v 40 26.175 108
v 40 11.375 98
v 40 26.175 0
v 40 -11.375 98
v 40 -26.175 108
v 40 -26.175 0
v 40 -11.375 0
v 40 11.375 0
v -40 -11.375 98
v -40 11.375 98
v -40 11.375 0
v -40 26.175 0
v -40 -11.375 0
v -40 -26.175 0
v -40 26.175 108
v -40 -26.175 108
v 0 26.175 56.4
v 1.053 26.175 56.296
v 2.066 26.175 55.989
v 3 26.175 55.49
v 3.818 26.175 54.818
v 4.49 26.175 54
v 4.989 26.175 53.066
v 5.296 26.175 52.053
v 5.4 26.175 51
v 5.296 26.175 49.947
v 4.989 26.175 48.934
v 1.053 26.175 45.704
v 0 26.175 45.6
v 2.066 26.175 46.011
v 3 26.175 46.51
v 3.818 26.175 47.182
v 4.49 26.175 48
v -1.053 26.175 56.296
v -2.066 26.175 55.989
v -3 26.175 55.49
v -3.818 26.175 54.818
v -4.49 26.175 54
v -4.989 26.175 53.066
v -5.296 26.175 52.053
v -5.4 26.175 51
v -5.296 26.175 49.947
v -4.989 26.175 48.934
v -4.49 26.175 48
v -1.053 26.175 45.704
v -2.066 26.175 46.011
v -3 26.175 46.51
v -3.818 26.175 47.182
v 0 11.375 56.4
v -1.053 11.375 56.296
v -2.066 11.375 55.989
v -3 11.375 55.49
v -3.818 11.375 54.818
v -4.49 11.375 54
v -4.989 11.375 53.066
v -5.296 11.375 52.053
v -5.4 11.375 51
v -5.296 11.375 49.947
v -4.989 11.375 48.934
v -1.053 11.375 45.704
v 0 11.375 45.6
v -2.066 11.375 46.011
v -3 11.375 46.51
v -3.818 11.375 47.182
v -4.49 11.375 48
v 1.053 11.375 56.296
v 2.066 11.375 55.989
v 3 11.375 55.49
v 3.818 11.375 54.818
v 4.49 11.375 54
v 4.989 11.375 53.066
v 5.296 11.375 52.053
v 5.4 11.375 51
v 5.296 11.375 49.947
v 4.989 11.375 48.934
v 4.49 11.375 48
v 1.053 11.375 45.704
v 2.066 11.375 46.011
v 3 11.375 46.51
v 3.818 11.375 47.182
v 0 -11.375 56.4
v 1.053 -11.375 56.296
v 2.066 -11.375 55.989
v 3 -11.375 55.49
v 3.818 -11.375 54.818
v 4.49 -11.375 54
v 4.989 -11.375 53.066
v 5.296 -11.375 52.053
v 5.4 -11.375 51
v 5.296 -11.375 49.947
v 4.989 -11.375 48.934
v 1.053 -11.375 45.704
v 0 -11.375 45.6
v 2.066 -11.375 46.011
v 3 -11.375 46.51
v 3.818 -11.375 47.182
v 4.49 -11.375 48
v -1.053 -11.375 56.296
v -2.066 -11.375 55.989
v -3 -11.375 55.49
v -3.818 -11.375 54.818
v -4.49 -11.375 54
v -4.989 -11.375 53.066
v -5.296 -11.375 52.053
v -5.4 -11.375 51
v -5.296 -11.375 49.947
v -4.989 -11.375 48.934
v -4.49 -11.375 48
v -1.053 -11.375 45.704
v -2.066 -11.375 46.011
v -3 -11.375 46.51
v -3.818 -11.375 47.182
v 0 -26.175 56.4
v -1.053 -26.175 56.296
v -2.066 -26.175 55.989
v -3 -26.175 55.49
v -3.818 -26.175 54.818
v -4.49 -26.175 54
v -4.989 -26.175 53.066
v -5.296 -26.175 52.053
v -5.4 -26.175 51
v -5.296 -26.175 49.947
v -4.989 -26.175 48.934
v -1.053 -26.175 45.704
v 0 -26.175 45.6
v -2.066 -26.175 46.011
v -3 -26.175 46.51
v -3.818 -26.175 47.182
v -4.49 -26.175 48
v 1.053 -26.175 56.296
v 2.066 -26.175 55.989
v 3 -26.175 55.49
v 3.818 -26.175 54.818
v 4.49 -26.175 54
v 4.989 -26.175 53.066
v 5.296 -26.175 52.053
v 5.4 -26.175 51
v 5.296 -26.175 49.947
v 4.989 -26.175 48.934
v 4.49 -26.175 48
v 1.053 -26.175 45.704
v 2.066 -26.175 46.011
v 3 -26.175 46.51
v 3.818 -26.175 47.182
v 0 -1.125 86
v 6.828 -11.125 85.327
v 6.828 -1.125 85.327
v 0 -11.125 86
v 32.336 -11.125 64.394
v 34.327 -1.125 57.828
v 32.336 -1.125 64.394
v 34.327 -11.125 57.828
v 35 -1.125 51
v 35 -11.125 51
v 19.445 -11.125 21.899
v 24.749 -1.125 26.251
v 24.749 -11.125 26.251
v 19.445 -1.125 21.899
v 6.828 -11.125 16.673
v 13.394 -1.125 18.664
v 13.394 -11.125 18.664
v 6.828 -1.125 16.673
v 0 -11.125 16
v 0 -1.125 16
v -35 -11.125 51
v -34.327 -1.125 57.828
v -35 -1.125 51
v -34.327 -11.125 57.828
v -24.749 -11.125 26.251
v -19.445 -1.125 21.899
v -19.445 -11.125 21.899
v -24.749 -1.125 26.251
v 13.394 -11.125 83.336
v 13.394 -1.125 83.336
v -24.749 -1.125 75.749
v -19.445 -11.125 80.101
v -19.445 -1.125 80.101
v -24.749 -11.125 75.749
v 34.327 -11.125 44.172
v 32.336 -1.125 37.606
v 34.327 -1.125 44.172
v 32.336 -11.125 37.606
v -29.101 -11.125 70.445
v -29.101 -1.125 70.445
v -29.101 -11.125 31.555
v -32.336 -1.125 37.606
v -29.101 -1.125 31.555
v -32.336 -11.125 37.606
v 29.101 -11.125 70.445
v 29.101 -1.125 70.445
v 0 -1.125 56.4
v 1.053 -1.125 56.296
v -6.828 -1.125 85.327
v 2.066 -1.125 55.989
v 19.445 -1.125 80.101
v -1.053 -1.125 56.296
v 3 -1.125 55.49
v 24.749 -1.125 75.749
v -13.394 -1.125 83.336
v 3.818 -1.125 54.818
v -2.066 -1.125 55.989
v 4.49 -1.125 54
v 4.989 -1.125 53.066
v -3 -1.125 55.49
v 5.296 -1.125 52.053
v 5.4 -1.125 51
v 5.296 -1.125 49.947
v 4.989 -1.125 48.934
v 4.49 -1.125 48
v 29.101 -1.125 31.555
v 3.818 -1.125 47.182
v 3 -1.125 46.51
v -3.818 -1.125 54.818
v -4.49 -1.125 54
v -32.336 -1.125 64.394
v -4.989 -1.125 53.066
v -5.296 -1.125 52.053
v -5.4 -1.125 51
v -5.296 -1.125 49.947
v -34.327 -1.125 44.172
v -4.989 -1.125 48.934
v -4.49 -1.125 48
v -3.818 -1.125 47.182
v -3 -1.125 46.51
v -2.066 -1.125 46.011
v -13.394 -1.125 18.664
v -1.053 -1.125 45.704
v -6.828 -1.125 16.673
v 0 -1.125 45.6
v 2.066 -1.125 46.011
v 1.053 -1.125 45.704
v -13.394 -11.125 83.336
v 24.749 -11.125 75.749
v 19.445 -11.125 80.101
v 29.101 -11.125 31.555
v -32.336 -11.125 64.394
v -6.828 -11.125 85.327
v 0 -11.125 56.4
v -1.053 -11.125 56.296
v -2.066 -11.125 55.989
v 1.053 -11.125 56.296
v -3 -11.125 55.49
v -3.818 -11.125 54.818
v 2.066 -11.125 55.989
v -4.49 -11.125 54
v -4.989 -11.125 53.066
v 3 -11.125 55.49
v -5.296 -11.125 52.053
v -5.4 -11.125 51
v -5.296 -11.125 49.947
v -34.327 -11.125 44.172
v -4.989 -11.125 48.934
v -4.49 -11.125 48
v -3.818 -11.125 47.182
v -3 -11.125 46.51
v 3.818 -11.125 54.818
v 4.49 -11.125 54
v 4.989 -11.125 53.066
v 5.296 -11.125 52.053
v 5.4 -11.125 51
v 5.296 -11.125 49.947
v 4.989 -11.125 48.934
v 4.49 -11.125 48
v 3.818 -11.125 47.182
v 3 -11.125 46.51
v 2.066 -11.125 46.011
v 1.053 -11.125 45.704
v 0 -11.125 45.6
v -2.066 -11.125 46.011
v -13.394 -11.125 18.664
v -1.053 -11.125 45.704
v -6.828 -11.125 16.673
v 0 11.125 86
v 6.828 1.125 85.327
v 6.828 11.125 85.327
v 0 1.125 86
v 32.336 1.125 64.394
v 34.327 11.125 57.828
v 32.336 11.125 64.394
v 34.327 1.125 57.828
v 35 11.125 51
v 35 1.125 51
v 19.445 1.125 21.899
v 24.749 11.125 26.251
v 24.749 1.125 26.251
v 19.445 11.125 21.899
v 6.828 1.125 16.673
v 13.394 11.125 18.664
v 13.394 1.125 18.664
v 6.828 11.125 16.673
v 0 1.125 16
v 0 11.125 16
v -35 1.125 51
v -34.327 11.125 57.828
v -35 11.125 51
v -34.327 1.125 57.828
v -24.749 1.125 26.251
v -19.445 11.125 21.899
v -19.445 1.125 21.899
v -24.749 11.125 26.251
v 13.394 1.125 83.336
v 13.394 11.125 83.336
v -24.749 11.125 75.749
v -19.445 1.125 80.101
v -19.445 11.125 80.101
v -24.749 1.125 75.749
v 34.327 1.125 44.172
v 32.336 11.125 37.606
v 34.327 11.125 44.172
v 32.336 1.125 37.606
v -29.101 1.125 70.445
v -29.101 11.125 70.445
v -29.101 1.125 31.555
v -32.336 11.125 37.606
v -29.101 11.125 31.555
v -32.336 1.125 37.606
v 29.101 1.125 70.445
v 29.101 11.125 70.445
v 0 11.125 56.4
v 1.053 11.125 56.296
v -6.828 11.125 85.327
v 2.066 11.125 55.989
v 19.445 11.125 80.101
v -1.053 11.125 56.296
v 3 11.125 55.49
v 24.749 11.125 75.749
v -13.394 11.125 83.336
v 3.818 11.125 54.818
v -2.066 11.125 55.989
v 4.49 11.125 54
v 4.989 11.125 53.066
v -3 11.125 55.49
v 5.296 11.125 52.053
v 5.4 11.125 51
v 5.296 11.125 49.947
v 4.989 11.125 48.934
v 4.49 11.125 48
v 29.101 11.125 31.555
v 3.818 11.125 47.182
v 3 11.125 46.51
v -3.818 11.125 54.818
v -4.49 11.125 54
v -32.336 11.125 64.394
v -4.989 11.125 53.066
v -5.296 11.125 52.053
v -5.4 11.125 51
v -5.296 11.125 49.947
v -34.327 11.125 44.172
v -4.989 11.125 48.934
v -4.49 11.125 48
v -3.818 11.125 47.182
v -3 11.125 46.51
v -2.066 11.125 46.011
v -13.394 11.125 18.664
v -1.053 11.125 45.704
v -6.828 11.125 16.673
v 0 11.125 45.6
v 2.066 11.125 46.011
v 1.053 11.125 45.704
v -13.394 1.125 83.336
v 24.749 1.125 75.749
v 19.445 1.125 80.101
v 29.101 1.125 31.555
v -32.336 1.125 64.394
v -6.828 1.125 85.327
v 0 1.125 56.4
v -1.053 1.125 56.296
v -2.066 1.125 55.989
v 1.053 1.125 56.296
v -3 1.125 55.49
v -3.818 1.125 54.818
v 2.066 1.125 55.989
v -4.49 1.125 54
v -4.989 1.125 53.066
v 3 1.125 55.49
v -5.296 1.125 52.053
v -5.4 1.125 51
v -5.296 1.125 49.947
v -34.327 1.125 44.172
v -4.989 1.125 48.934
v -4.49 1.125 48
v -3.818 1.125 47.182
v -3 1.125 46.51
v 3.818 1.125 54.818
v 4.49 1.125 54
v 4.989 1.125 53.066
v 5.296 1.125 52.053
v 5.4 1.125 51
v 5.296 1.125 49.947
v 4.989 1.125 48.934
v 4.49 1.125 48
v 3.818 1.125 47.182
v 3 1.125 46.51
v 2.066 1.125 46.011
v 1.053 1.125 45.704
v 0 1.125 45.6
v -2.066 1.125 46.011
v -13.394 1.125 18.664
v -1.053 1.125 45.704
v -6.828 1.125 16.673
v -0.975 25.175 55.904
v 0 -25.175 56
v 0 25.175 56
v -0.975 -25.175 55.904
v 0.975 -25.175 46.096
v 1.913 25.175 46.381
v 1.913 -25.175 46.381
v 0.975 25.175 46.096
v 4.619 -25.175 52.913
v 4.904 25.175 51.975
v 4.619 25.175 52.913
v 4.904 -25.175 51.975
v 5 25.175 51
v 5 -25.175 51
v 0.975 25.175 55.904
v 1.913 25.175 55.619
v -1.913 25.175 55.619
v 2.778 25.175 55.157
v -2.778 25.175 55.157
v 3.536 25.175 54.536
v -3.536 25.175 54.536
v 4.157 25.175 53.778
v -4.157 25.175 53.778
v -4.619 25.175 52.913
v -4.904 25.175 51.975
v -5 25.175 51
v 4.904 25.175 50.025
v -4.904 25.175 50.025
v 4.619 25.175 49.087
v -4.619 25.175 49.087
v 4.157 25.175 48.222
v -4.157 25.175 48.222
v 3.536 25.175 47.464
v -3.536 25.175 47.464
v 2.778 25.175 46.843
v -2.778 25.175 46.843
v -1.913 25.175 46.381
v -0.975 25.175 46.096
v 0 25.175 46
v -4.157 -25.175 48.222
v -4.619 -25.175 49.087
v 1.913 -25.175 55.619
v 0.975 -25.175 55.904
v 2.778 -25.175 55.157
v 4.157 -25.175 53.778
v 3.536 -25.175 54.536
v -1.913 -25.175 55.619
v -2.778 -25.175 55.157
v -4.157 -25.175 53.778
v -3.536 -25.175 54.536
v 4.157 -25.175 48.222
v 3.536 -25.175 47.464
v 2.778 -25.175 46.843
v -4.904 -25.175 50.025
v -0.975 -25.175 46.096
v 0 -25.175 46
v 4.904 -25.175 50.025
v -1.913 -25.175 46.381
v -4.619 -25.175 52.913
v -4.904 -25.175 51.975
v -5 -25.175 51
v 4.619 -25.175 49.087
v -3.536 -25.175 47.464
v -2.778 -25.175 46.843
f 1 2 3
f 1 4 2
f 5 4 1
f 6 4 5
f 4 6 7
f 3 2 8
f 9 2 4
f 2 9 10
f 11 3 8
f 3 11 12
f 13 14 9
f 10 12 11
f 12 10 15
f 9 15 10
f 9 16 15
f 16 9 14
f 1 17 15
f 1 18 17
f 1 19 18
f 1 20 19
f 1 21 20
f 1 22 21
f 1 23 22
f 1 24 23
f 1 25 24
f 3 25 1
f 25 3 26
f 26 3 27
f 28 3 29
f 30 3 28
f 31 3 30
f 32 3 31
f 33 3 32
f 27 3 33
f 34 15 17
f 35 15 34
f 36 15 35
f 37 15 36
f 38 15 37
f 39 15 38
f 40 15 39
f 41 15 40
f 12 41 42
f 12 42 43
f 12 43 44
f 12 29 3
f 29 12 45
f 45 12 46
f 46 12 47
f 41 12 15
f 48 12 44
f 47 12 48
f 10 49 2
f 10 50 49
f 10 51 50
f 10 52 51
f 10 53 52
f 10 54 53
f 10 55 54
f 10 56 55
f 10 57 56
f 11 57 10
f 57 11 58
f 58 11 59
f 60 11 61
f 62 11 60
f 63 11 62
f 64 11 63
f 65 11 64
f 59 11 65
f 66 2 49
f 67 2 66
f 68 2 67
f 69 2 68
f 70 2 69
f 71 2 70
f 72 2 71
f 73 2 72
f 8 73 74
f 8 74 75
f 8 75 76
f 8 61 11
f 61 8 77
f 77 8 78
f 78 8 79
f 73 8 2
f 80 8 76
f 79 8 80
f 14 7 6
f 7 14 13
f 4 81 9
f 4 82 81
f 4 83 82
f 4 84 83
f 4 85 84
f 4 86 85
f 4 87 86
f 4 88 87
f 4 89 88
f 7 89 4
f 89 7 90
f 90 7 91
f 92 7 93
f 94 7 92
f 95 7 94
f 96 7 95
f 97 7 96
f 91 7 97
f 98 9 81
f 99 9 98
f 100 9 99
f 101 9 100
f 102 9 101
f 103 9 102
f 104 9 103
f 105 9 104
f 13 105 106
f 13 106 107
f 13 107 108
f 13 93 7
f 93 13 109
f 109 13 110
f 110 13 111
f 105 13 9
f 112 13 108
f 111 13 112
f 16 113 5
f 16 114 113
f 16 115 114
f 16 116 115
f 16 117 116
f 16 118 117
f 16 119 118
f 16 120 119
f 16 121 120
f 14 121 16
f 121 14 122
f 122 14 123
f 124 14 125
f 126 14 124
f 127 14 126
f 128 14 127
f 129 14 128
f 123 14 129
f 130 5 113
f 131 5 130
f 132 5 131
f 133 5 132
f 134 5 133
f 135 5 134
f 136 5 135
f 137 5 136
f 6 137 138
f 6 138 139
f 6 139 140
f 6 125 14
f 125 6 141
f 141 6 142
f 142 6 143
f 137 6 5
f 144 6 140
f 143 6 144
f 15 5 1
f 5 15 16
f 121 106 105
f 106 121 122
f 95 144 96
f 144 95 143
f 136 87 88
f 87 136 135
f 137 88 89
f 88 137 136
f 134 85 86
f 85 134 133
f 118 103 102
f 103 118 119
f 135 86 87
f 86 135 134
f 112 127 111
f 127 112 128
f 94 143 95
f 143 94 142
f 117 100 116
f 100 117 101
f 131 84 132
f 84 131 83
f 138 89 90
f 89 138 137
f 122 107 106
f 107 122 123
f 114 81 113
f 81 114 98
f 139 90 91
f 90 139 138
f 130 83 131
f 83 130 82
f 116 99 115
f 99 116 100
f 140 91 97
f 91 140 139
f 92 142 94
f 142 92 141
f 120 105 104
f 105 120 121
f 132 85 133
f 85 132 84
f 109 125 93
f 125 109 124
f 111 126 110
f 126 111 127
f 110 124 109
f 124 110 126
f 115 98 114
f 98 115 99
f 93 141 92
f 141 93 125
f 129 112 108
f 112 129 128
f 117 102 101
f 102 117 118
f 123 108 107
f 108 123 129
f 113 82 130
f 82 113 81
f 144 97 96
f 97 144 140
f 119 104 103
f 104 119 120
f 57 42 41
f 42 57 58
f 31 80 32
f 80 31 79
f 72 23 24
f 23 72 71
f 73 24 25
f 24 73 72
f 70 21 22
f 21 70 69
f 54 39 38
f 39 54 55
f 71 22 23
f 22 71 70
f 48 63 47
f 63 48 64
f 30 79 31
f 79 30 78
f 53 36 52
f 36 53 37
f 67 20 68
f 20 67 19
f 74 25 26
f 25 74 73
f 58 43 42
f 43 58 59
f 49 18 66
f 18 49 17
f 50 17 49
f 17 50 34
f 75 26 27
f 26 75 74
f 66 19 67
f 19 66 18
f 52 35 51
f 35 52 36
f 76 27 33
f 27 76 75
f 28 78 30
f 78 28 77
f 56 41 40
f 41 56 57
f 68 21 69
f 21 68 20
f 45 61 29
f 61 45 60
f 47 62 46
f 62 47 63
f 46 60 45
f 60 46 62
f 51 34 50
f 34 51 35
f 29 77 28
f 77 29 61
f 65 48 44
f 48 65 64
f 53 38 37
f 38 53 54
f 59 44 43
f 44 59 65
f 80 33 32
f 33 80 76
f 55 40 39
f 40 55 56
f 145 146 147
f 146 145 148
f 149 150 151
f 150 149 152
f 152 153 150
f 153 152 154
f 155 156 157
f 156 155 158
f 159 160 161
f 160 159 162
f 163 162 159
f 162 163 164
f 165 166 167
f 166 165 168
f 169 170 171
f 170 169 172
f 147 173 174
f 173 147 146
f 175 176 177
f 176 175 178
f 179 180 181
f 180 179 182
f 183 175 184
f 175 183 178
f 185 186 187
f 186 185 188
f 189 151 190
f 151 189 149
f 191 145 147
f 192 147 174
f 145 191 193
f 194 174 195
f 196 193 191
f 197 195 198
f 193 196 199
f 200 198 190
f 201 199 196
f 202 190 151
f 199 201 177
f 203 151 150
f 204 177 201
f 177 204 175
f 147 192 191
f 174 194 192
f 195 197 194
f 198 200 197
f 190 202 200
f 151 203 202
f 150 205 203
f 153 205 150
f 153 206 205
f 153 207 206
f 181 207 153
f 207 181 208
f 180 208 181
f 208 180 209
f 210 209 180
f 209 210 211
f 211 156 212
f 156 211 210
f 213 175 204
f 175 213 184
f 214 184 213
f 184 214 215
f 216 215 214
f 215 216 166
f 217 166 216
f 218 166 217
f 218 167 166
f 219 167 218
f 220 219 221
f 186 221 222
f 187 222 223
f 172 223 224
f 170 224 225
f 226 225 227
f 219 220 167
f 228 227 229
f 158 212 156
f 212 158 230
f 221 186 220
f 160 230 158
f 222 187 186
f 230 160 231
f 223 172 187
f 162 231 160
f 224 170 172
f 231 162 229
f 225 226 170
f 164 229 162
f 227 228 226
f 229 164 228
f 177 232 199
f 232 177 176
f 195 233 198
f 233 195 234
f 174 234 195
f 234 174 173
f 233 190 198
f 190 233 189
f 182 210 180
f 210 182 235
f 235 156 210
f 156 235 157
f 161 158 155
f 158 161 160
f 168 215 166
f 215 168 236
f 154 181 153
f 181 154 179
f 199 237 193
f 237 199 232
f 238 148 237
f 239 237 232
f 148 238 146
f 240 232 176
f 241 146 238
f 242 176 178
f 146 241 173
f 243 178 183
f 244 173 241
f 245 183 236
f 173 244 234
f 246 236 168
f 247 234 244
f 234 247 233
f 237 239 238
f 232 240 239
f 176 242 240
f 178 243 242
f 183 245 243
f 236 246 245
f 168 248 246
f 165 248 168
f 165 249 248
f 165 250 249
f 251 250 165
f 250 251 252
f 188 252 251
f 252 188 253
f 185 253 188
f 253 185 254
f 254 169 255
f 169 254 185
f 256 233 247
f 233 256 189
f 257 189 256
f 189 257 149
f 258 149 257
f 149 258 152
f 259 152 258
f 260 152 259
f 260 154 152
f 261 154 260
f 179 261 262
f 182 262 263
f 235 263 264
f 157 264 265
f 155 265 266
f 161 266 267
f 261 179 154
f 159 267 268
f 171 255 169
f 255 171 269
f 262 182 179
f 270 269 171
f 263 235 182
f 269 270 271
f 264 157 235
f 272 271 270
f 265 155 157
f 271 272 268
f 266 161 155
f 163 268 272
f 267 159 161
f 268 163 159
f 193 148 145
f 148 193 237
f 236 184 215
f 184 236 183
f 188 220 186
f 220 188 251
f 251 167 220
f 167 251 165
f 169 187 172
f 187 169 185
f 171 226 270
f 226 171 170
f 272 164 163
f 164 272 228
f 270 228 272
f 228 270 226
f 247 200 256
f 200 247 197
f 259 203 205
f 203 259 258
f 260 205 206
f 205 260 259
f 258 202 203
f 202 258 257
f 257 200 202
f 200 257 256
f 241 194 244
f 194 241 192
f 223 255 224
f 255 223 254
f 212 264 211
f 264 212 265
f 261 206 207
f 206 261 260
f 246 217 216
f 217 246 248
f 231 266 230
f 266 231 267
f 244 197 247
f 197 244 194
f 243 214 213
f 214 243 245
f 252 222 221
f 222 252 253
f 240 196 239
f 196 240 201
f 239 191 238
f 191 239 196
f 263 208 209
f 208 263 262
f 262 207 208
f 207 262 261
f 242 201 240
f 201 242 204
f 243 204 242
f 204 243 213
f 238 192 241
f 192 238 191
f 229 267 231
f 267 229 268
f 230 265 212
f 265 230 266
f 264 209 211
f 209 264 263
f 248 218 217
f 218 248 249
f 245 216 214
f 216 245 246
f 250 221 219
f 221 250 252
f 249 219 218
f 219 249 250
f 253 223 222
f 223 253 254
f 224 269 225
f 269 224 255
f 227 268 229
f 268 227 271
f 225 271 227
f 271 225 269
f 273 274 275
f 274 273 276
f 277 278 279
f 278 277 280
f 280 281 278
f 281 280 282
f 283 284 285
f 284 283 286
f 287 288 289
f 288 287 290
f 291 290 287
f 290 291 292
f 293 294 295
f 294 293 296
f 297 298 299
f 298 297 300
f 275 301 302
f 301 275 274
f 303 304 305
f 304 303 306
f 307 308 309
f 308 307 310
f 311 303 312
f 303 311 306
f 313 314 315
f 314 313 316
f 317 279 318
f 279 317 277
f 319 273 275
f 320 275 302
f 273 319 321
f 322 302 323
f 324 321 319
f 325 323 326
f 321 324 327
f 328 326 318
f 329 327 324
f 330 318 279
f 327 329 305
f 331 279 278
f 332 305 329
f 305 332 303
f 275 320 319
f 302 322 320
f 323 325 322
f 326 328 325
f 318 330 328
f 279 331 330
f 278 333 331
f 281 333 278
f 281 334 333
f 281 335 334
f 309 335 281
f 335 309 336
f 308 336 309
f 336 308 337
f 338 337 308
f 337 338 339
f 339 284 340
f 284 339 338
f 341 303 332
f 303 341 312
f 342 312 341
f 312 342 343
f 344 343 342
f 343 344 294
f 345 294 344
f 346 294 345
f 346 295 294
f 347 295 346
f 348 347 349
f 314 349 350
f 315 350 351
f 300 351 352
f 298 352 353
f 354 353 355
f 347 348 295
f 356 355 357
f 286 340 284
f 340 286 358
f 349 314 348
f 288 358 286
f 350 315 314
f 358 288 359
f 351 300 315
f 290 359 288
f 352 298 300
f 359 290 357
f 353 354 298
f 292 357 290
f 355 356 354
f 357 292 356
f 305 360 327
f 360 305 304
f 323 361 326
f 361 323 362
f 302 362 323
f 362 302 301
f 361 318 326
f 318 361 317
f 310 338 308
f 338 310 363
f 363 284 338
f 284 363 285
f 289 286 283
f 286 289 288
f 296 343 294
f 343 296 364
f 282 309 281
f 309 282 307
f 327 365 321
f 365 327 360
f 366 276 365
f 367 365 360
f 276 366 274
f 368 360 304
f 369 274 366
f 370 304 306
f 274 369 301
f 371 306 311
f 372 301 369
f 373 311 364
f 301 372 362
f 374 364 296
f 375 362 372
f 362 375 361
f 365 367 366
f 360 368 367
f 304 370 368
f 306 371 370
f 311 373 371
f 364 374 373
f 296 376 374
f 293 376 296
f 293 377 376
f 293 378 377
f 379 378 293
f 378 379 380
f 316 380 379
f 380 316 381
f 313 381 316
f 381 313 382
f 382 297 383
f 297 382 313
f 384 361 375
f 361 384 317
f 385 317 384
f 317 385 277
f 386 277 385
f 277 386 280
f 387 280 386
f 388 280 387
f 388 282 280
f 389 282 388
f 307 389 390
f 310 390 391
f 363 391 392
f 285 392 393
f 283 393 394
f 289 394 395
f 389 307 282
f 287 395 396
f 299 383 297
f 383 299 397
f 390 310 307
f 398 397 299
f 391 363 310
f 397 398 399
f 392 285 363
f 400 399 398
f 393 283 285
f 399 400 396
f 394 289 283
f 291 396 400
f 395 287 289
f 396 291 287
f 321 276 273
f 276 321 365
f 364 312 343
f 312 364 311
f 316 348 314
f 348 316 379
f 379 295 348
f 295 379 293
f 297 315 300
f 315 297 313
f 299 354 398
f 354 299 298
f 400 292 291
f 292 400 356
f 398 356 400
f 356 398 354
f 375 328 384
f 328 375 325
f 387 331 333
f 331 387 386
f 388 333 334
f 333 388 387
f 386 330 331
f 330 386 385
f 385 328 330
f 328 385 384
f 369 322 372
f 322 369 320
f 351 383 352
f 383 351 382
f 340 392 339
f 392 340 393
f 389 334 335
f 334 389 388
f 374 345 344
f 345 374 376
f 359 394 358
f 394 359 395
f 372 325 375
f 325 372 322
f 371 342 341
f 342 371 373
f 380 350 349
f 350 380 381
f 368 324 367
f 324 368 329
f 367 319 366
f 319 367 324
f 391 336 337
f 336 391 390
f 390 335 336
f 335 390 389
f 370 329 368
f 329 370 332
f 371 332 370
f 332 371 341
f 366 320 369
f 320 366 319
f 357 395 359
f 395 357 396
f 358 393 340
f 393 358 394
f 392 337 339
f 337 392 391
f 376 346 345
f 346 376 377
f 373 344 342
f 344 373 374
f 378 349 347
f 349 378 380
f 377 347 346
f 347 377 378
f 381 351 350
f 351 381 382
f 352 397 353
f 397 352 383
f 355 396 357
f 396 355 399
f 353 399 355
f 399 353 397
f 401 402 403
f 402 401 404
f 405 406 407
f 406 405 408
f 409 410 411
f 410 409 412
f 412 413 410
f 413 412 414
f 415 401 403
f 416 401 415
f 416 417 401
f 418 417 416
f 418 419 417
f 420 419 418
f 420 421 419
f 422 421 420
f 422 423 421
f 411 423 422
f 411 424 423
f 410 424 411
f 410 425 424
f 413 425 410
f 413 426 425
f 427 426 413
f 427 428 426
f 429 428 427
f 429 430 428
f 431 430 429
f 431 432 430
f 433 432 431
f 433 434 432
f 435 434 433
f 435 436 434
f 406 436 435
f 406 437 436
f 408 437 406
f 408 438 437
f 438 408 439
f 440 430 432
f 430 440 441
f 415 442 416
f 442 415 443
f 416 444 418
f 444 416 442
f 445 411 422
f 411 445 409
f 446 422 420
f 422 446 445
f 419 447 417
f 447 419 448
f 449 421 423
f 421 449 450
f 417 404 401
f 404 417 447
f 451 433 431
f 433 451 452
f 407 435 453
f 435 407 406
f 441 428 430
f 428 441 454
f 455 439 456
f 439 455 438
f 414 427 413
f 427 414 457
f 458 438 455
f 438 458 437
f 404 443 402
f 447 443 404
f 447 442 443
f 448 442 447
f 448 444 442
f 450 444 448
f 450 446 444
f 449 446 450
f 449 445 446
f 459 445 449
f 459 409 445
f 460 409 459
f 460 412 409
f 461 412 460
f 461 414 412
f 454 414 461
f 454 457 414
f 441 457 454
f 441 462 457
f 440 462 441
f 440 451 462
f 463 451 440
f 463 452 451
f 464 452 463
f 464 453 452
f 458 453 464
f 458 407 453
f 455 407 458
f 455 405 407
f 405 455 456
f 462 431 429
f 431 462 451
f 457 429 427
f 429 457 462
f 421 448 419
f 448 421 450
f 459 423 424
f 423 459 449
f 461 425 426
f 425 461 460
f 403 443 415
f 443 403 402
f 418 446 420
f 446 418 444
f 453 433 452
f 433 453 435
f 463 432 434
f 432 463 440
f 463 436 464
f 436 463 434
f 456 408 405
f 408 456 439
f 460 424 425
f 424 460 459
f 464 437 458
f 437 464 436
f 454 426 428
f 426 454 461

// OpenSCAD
$fn = 32;

// ------------------------------------------------------------------------
// Trolley wheel set: wheels d70, fork 98 mm tall
// Every part is its own module, assembly() places every instance.
// ------------------------------------------------------------------------

// --- part 1 ---
module trolley_fork() {
  difference() {
    union() {
      translate([-40, 11.375, 0]) cube([80, 14.8, 98]);
      translate([-40, -26.175, 0]) cube([80, 14.8, 98]);
      translate([-40, -26.175, 98]) cube([80, 52.35, 10]);
    }
    translate([0, -18.775, 51]) rotate([90, 0, 0]) cylinder(h = 16.8, d = 10.8, center = true);
    translate([0, 18.775, 51]) rotate([90, 0, 0]) cylinder(h = 16.8, d = 10.8, center = true);
  }
}

// --- part 2 ---
module trolley_wheel() {
  difference() {
      translate([0, 0, 0]) cylinder(h = 10, d = 70);
      translate([0, 0, -1]) cylinder(h = 12, d = 10.8);
    }
}

// --- part 3 ---
module trolley_axle() {
  translate([0, 0, -25.175]) cylinder(h = 50.35, d = 10);
}

// --- assembly ---
module assembly() {
  color([0.80, 0.24, 0.20]) translate([0, 0, 0]) rotate([0, 0, 0]) trolley_fork();
  color([0.20, 0.45, 0.75]) translate([0, -1.125, 51]) rotate([90, 0, 0]) trolley_wheel();
  color([0.25, 0.62, 0.32]) translate([0, 11.125, 51]) rotate([90, 0, 0]) trolley_wheel();
  color([0.92, 0.70, 0.18]) translate([0, 0, 51]) rotate([90, 0, 0]) trolley_axle();
}

assembly();
